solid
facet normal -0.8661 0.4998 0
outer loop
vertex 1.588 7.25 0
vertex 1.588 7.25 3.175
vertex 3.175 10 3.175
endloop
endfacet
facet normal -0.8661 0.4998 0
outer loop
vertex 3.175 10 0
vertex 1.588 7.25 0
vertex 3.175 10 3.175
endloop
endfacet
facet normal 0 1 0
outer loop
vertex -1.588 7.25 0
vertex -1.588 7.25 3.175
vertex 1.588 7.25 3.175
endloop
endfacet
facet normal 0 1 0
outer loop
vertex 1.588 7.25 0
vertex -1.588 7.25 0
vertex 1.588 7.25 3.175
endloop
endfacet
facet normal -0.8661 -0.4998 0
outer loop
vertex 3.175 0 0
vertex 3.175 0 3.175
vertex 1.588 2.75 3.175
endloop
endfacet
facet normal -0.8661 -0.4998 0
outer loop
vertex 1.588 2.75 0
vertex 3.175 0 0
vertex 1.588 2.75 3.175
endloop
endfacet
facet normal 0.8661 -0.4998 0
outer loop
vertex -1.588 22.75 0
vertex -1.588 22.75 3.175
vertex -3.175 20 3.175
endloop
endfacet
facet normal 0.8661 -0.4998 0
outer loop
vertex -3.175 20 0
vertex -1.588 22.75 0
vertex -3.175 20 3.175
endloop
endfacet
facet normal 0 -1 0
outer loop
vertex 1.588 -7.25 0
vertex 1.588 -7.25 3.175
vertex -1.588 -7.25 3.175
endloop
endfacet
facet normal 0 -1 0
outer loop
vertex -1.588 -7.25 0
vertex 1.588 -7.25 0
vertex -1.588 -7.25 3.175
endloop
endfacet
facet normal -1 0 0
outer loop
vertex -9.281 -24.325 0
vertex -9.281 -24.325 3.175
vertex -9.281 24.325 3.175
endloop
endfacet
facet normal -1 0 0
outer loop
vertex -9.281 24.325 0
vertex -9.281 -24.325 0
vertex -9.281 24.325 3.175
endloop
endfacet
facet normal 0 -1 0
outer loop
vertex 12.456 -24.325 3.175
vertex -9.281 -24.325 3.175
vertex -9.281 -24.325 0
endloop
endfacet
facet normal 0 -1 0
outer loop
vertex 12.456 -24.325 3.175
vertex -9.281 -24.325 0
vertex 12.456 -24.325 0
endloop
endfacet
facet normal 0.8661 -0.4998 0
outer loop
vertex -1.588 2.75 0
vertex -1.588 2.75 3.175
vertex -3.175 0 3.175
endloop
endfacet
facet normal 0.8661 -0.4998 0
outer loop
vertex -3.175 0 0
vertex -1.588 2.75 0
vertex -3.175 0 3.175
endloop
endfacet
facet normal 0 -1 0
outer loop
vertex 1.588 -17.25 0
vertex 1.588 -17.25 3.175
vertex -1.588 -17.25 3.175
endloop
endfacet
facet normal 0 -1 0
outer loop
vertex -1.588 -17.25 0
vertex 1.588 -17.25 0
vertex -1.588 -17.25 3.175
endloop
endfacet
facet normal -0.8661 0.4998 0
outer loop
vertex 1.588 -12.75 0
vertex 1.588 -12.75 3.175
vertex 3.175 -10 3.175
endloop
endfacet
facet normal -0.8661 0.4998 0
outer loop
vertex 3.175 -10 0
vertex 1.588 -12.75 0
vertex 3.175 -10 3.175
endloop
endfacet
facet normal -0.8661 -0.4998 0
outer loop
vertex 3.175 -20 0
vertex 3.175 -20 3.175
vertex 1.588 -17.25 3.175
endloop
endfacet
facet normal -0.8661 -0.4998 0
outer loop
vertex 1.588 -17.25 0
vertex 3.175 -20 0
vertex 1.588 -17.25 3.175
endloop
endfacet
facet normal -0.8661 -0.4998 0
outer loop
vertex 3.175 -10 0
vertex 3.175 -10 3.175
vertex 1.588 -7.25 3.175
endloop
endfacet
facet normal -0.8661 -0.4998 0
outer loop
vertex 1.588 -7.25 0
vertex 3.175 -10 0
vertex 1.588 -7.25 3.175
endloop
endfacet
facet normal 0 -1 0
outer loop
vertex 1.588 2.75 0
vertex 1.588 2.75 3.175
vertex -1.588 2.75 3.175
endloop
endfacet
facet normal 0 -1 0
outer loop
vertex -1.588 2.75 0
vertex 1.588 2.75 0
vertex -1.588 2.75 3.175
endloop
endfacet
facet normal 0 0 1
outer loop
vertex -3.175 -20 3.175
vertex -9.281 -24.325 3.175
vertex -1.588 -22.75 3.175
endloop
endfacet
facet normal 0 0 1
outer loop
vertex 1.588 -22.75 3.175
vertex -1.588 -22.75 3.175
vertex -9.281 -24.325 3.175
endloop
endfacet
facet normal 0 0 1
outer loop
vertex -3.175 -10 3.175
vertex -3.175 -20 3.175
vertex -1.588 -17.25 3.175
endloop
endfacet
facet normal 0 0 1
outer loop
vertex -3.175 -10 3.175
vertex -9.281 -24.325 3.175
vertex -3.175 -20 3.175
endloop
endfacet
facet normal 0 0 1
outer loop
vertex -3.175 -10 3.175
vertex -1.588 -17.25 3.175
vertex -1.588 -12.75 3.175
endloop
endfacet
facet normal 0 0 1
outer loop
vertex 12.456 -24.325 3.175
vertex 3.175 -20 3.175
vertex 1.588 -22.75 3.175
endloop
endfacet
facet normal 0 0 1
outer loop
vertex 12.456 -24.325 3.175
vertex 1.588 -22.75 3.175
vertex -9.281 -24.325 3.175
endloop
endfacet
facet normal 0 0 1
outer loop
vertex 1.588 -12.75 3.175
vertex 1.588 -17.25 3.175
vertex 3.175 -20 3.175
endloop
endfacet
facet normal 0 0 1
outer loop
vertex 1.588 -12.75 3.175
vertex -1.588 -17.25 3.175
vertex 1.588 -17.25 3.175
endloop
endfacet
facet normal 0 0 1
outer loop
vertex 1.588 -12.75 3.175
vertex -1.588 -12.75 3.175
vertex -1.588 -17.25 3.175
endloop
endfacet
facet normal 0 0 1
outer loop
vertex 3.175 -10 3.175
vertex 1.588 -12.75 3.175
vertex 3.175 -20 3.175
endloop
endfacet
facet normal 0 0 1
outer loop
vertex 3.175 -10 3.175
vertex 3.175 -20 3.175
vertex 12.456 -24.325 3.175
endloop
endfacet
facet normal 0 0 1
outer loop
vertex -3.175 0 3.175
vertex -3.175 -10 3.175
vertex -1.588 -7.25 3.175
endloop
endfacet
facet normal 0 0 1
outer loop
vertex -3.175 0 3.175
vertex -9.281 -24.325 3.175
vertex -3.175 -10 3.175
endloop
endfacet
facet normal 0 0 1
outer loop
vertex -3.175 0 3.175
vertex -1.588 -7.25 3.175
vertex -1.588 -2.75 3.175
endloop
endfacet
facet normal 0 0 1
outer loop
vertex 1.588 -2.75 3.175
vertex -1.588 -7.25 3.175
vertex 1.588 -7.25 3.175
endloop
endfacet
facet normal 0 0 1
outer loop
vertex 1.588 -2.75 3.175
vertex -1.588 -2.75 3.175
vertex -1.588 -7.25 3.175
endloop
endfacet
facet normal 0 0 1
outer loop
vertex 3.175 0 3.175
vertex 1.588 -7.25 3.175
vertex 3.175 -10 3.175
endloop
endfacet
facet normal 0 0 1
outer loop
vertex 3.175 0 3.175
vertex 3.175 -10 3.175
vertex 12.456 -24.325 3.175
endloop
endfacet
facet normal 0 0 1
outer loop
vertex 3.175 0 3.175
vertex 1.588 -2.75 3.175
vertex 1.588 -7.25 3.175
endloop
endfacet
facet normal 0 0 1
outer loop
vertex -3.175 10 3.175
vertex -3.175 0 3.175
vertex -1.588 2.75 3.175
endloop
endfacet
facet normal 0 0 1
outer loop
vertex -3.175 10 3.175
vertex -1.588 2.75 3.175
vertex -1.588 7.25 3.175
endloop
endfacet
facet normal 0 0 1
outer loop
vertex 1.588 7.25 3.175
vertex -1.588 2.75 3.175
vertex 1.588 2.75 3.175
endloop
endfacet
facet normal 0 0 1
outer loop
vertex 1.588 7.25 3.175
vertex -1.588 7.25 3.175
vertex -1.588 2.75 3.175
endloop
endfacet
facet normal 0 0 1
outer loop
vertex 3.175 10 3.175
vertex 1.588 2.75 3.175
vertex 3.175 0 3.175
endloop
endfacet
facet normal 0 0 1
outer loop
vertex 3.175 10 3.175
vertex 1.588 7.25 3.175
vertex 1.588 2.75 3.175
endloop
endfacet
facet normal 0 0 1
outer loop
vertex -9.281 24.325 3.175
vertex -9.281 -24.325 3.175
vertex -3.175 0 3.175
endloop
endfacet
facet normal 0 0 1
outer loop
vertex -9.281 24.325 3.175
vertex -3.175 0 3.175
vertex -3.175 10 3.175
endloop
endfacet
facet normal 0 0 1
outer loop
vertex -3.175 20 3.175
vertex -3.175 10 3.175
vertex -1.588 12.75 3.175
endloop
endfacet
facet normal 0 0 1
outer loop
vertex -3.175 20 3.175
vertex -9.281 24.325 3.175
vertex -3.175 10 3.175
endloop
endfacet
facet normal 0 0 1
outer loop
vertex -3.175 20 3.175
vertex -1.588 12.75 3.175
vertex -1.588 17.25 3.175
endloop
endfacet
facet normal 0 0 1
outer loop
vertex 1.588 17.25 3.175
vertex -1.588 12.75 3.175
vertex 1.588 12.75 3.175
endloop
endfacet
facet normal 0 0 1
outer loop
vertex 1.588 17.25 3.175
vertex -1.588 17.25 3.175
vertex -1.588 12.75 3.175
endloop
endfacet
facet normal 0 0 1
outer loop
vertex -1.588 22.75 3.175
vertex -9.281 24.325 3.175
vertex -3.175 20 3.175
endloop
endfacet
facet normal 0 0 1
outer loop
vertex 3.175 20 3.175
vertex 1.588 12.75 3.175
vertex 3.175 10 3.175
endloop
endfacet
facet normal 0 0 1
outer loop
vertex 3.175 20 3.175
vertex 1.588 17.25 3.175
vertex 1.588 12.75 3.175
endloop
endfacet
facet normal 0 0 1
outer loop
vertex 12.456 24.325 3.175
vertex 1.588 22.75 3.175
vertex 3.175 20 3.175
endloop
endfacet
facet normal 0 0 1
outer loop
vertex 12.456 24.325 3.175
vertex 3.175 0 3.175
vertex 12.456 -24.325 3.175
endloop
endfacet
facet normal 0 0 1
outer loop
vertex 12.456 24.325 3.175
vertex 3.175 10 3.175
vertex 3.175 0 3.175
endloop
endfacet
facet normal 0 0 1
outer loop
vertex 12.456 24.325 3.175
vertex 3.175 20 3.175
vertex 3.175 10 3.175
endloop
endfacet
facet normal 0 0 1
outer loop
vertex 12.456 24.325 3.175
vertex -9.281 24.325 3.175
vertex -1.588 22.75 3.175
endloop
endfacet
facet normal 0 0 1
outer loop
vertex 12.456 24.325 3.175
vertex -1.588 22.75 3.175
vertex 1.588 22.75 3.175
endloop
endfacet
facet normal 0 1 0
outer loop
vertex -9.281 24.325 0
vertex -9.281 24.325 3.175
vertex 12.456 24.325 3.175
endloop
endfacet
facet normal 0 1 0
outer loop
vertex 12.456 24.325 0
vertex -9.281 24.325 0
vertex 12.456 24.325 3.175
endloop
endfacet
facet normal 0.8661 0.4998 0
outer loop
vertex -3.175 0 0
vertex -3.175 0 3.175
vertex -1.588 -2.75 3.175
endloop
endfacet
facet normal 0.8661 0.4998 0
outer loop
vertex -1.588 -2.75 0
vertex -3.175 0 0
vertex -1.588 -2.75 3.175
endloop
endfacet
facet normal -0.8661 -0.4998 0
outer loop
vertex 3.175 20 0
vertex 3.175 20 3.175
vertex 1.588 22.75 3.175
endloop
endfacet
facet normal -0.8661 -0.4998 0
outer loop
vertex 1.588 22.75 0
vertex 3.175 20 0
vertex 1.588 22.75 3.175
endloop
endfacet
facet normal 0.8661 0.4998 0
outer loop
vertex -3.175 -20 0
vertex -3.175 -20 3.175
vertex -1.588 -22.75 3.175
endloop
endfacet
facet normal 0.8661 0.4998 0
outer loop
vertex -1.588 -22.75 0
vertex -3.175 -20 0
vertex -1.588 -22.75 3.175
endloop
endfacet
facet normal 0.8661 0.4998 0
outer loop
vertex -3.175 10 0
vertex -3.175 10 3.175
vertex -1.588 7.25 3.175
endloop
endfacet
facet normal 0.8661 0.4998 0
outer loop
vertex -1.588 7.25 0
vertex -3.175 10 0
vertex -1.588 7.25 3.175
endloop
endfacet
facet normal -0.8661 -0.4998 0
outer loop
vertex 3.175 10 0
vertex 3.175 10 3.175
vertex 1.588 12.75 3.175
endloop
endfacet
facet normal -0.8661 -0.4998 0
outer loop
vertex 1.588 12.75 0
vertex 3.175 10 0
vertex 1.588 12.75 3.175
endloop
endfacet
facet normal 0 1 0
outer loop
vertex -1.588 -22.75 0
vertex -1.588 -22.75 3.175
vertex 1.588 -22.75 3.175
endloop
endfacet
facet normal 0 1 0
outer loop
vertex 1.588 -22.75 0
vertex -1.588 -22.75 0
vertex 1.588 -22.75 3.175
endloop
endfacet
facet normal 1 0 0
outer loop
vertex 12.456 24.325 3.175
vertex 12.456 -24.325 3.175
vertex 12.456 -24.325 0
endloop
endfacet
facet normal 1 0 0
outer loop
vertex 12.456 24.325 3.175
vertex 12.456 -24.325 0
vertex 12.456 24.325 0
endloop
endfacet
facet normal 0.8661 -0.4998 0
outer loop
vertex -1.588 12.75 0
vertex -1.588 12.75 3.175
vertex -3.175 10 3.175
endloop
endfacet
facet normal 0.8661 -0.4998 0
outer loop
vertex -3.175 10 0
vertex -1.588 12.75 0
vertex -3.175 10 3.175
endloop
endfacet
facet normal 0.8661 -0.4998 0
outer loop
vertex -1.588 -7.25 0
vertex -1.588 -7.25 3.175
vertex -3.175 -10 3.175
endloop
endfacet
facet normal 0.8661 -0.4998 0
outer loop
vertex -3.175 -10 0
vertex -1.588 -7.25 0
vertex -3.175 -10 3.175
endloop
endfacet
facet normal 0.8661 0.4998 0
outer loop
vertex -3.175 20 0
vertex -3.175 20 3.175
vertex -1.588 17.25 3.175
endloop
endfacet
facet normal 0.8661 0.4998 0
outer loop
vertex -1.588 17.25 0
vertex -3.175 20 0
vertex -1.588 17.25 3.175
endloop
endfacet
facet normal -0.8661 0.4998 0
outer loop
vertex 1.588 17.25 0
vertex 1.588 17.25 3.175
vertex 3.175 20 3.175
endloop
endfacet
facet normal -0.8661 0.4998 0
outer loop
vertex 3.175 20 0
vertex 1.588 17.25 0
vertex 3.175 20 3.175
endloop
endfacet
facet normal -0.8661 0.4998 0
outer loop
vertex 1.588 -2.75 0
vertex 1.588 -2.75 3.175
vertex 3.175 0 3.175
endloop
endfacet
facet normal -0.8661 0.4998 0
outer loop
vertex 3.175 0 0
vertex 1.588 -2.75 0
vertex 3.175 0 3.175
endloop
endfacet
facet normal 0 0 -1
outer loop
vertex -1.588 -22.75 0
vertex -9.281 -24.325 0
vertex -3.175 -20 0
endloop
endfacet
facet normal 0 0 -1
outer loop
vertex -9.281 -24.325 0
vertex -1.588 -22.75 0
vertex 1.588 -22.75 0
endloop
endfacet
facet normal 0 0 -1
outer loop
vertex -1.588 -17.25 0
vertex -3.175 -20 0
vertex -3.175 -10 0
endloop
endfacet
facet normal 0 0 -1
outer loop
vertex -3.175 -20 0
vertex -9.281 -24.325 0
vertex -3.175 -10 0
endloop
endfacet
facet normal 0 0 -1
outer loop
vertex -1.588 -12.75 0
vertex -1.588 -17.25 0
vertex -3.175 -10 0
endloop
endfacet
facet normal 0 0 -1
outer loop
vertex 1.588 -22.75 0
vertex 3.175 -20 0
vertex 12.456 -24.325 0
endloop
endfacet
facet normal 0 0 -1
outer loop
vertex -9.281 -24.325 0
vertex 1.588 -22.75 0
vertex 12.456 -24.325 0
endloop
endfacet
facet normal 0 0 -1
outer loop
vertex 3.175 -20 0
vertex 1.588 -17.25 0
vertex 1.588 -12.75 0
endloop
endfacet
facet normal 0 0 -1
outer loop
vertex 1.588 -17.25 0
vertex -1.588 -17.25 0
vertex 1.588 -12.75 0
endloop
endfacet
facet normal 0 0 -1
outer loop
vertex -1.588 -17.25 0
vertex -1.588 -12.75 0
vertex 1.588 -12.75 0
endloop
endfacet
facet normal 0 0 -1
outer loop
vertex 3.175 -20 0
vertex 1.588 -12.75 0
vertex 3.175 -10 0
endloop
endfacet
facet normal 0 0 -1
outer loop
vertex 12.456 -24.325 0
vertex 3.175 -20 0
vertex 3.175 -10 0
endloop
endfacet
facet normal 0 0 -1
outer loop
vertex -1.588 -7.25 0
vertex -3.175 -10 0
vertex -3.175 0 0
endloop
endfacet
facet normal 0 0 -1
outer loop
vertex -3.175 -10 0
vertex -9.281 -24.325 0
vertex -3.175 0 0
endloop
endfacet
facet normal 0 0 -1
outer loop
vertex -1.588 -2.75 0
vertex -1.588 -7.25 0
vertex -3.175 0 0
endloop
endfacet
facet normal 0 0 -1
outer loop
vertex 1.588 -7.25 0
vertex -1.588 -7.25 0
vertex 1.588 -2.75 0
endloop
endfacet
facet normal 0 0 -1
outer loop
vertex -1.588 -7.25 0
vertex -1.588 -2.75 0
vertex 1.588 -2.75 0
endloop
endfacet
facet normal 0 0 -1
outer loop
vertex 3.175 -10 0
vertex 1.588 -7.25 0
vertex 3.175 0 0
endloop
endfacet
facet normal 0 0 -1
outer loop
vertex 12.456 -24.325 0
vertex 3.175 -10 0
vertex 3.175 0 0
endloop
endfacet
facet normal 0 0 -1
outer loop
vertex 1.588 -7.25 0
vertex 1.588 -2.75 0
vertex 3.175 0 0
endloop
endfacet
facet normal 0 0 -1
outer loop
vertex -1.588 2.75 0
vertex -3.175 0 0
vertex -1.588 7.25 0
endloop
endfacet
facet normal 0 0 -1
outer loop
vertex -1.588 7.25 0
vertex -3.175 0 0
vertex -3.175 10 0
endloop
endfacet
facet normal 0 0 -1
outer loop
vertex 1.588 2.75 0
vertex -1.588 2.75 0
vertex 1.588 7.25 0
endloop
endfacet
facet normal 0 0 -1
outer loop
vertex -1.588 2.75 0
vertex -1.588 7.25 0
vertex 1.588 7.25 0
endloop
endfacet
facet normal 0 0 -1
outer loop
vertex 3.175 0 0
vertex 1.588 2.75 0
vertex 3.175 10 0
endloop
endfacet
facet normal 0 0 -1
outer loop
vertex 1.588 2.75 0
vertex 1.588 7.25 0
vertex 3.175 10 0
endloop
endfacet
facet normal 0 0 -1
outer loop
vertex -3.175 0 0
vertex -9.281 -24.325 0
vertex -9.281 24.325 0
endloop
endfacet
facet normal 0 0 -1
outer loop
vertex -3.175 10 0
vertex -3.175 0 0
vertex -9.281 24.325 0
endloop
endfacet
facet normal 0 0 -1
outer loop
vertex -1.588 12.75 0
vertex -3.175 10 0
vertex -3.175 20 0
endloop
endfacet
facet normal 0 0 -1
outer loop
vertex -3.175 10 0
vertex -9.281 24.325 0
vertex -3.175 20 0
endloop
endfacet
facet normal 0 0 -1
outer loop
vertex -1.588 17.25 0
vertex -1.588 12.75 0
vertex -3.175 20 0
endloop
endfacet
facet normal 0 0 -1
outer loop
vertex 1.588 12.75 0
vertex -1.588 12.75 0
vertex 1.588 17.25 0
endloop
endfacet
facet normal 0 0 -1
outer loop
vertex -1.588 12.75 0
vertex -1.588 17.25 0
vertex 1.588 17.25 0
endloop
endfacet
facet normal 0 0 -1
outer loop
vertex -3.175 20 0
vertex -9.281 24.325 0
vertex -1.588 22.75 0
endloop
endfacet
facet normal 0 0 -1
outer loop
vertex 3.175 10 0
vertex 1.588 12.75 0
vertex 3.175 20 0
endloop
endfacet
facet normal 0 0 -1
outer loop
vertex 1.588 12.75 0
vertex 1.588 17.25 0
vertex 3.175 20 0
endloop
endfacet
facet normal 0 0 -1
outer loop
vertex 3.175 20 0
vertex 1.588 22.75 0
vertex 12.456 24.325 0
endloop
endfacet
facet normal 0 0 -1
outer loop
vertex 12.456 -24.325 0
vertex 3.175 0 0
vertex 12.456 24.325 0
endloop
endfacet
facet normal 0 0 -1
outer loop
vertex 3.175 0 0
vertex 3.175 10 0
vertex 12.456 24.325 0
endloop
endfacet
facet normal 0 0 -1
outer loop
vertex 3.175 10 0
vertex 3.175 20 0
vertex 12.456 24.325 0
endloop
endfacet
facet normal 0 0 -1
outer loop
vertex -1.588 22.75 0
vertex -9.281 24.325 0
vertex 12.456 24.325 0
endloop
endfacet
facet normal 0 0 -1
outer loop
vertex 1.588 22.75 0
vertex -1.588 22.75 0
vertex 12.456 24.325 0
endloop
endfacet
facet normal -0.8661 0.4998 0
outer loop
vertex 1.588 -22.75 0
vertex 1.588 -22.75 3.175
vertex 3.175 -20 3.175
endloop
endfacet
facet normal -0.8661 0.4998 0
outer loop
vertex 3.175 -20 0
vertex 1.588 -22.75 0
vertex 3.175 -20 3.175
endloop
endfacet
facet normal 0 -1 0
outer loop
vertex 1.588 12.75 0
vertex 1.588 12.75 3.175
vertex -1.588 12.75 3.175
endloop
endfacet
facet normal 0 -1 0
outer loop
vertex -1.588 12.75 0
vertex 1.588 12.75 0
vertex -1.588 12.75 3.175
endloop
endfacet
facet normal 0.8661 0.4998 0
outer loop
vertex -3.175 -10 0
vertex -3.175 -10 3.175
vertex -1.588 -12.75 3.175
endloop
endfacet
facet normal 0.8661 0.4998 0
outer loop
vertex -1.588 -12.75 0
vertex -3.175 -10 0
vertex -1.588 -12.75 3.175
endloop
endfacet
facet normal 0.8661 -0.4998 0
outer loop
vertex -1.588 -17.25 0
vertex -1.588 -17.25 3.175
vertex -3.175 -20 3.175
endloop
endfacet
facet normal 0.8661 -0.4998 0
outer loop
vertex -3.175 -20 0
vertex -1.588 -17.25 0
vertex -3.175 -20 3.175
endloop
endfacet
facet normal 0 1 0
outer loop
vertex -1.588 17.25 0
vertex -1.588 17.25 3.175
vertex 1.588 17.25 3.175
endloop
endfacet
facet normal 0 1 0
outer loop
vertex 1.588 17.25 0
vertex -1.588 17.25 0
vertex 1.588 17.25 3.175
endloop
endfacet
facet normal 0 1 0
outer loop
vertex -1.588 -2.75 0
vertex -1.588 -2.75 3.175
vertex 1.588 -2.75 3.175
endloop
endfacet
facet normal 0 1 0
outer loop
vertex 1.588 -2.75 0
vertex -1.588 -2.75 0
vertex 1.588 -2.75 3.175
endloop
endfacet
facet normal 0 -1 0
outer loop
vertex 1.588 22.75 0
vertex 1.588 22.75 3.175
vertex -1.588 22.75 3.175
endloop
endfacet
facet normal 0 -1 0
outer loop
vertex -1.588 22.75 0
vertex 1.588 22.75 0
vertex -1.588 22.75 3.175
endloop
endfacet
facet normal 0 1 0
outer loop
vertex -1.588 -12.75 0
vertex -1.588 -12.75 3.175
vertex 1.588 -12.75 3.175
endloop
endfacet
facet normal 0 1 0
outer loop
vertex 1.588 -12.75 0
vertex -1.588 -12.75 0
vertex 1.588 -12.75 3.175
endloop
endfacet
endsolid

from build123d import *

# Parameters (mm, degrees)
SKETCH1_W               = 31.2625
SKETCH1_H               = 55
BOSS_EXTRUDE1_DEPTH     = 3.175
SKETCH2_R               = 1.5
CUT_EXTRUDE1_DEPTH      = 10
LPATTERN1_COUNT         = 3
LPATTERN1_PITCH         = 10
LPATTERN1_COL_COUNT     = 3
LPATTERN1_COL_PITCH     = 10
SKETCH3_W               = 6.35
SKETCH3_H               = 3.175
CUT_EXTRUDE2_DEPTH      = 10
LPATTERN2_COUNT         = 5
LPATTERN2_PITCH         = 6.35
LPATTERN2_COL_COUNT     = 5
LPATTERN2_COL_PITCH     = 6.35
SKETCH4_W               = 3.175
SKETCH4_H               = 3.6875
SKETCH4_H_2             = 3.175
CUT_EXTRUDE3_DEPTH      = 10
SKETCH5_W               = 6.35
SKETCH5_H               = 55
CUT_EXTRUDE4_DEPTH      = 10
SKETCH6_W               = 3.175
SKETCH6_H               = 3.175
CUT_EXTRUDE5_DEPTH      = 10
LPATTERN3_COUNT         = 2
LPATTERN3_PITCH         = 6.35
LPATTERN3_COUNT_DIR2    = 2
LPATTERN3_PITCH_DIR2    = 6.35
SKETCH7_W               = 5.8625
SKETCH7_H               = 3.175
CUT_EXTRUDE6_DEPTH      = 10
MIRROR1_COPY_1_SKETCH_W = 3.175
MIRROR1_COPY_1_SKETCH_H = 3.175
MIRROR1_COPY_1_DEPTH    = 10
MIRROR1_COPY_2_SKETCH_W = 3.175
MIRROR1_COPY_2_SKETCH_H = 3.175
MIRROR1_COPY_2_DEPTH    = 10
MIRROR1_COPY_3_SKETCH_W = 3.175
MIRROR1_COPY_3_SKETCH_H = 3.175
MIRROR1_COPY_3_DEPTH    = 10
SKETCH8_W               = 21.7375
SKETCH8_H               = 3.175
SKETCH8_W_2             = 3.175
SKETCH8_H_2             = 41.275
SKETCH8_W_3             = 15.875
CUT_EXTRUDE7_DEPTH      = 10
CUT_EXTRUDE8_DEPTH      = 10
LPATTERN4_COUNT         = 5
LPATTERN4_PITCH         = 10


with BuildPart() as part:
    # Sketch1 → Boss-Extrude1 (new body)
    with BuildSketch(Plane.XY):
        Rectangle(SKETCH1_W, SKETCH1_H)
    extrude(amount=BOSS_EXTRUDE1_DEPTH)

    # Sketch2 → Cut-Extrude1 (cut)
    with BuildSketch(Plane.XY.offset(3.175)):
        Circle(SKETCH2_R)
    cut_extrude1 = extrude(amount=-CUT_EXTRUDE1_DEPTH, mode=Mode.SUBTRACT)

    # LPattern1: Cut-Extrude1 ×3
    with Locations(*[(0, i * LPATTERN1_PITCH, 0) for i in range(1, LPATTERN1_COUNT)]):
        add(cut_extrude1, mode=Mode.SUBTRACT)

    # LPattern1 col: Cut-Extrude1 ×3
    with Locations(*[(0, -i * LPATTERN1_COL_PITCH, 0) for i in range(1, LPATTERN1_COL_COUNT)]):
        add(cut_extrude1, mode=Mode.SUBTRACT)

    # Sketch3 → Cut-Extrude2 (cut)
    with BuildSketch(Plane.XY.offset(3.175)):
        with Locations((15.63125, -3.175)):
            Rectangle(SKETCH3_W, SKETCH3_H)
    cut_extrude2 = extrude(amount=-CUT_EXTRUDE2_DEPTH, mode=Mode.SUBTRACT)

    # LPattern2: Cut-Extrude2 ×5
    with Locations(*[(0, i * LPATTERN2_PITCH, 0) for i in range(1, LPATTERN2_COUNT)]):
        add(cut_extrude2, mode=Mode.SUBTRACT)

    # LPattern2 col: Cut-Extrude2 ×5
    with Locations(*[(0, -i * LPATTERN2_COL_PITCH, 0) for i in range(1, LPATTERN2_COL_COUNT)]):
        add(cut_extrude2, mode=Mode.SUBTRACT)

    # Sketch4 → Cut-Extrude3 (cut)
    with BuildSketch(Plane.XY.offset(3.175)):
        with Locations((14.04375, 25.65625)):
            Rectangle(SKETCH4_W, SKETCH4_H)
        with Locations((14.04375, -25.4)):
            Rectangle(SKETCH4_W, SKETCH4_H_2)
    extrude(amount=-CUT_EXTRUDE3_DEPTH, mode=Mode.SUBTRACT)

    # Sketch5 → Cut-Extrude4 (cut)
    with BuildSketch(Plane.XY.offset(3.175)):
        with Locations((-12.45625, 0)):
            Rectangle(SKETCH5_W, SKETCH5_H)
    extrude(amount=-CUT_EXTRUDE4_DEPTH, mode=Mode.SUBTRACT)

    # Sketch6 → Cut-Extrude5 (cut)
    with BuildSketch(Plane.XY.offset(3.175)):
        with Locations((-4.51875, 25.9125)):
            Rectangle(SKETCH6_W, SKETCH6_H)
    cut_extrude5 = extrude(amount=-CUT_EXTRUDE5_DEPTH, mode=Mode.SUBTRACT)

    # LPattern3: Cut-Extrude5 2 × 2
    with Locations(*[(i * LPATTERN3_PITCH, j * LPATTERN3_PITCH_DIR2, 0) for i in range(LPATTERN3_COUNT) for j in range(LPATTERN3_COUNT_DIR2) if (i, j) != (0, 0)]):
        add(cut_extrude5, mode=Mode.SUBTRACT)

    # Sketch7 → Cut-Extrude6 (cut)
    with BuildSketch(Plane.XY.offset(3.175)):
        with Locations((9.525, 25.9125)):
            Rectangle(SKETCH7_W, SKETCH7_H)
    cut_extrude6 = extrude(amount=-CUT_EXTRUDE6_DEPTH, mode=Mode.SUBTRACT)

    # Mirror1: Cut-Extrude5, Cut-Extrude6 across plane
    add(cut_extrude5.mirror(Plane.ZX), mode=Mode.SUBTRACT)
    add(cut_extrude6.mirror(Plane.ZX), mode=Mode.SUBTRACT)

    # Mirror1 copy 1 sketch → Mirror1 copy 1 (cut)
    with BuildSketch(Plane(origin=(0, -6.35, 3.175), x_dir=(1, 0, 0), z_dir=(0, 0, 1))):
        with Locations((-4.51875, -25.9125)):
            Rectangle(MIRROR1_COPY_1_SKETCH_W, MIRROR1_COPY_1_SKETCH_H)
    extrude(amount=-MIRROR1_COPY_1_DEPTH, mode=Mode.SUBTRACT)

    # Mirror1 copy 2 sketch → Mirror1 copy 2 (cut)
    with BuildSketch(Plane(origin=(6.35, 0, 3.175), x_dir=(1, 0, 0), z_dir=(0, 0, 1))):
        with Locations((-4.51875, -25.9125)):
            Rectangle(MIRROR1_COPY_2_SKETCH_W, MIRROR1_COPY_2_SKETCH_H)
    extrude(amount=-MIRROR1_COPY_2_DEPTH, mode=Mode.SUBTRACT)

    # Mirror1 copy 3 sketch → Mirror1 copy 3 (cut)
    with BuildSketch(Plane(origin=(6.35, -6.35, 3.175), x_dir=(1, 0, 0), z_dir=(0, 0, 1))):
        with Locations((-4.51875, -25.9125)):
            Rectangle(MIRROR1_COPY_3_SKETCH_W, MIRROR1_COPY_3_SKETCH_H)
    extrude(amount=-MIRROR1_COPY_3_DEPTH, mode=Mode.SUBTRACT)

    # Sketch8 → Cut-Extrude7 (cut)
    with BuildSketch(Plane.XY.offset(3.175)):
        with Locations((1.5875, 25.9125)):
            Rectangle(SKETCH8_W, SKETCH8_H)
        with Locations((14.04375, 0)):
            Rectangle(SKETCH8_W_2, SKETCH8_H_2)
        with Locations((-1.34375, -25.9125)):
            Rectangle(SKETCH8_W_3, SKETCH8_H)
    extrude(amount=-CUT_EXTRUDE7_DEPTH, mode=Mode.SUBTRACT)

    # Sketch9 → Cut-Extrude8 (cut)
    with BuildSketch(Plane.XY.offset(3.175)):
        Polygon((3.175426481, 20), (1.58771324, 22.75), (-1.58771324, 22.75), (-3.175426481, 20), (-1.58771324, 17.25), (1.58771324, 17.25), align=None)
    cut_extrude8 = extrude(amount=-CUT_EXTRUDE8_DEPTH, mode=Mode.SUBTRACT)

    # LPattern4: Cut-Extrude8 ×5
    with Locations(*[(0, -i * LPATTERN4_PITCH, 0) for i in range(1, LPATTERN4_COUNT)]):
        add(cut_extrude8, mode=Mode.SUBTRACT)


solid = part.part
